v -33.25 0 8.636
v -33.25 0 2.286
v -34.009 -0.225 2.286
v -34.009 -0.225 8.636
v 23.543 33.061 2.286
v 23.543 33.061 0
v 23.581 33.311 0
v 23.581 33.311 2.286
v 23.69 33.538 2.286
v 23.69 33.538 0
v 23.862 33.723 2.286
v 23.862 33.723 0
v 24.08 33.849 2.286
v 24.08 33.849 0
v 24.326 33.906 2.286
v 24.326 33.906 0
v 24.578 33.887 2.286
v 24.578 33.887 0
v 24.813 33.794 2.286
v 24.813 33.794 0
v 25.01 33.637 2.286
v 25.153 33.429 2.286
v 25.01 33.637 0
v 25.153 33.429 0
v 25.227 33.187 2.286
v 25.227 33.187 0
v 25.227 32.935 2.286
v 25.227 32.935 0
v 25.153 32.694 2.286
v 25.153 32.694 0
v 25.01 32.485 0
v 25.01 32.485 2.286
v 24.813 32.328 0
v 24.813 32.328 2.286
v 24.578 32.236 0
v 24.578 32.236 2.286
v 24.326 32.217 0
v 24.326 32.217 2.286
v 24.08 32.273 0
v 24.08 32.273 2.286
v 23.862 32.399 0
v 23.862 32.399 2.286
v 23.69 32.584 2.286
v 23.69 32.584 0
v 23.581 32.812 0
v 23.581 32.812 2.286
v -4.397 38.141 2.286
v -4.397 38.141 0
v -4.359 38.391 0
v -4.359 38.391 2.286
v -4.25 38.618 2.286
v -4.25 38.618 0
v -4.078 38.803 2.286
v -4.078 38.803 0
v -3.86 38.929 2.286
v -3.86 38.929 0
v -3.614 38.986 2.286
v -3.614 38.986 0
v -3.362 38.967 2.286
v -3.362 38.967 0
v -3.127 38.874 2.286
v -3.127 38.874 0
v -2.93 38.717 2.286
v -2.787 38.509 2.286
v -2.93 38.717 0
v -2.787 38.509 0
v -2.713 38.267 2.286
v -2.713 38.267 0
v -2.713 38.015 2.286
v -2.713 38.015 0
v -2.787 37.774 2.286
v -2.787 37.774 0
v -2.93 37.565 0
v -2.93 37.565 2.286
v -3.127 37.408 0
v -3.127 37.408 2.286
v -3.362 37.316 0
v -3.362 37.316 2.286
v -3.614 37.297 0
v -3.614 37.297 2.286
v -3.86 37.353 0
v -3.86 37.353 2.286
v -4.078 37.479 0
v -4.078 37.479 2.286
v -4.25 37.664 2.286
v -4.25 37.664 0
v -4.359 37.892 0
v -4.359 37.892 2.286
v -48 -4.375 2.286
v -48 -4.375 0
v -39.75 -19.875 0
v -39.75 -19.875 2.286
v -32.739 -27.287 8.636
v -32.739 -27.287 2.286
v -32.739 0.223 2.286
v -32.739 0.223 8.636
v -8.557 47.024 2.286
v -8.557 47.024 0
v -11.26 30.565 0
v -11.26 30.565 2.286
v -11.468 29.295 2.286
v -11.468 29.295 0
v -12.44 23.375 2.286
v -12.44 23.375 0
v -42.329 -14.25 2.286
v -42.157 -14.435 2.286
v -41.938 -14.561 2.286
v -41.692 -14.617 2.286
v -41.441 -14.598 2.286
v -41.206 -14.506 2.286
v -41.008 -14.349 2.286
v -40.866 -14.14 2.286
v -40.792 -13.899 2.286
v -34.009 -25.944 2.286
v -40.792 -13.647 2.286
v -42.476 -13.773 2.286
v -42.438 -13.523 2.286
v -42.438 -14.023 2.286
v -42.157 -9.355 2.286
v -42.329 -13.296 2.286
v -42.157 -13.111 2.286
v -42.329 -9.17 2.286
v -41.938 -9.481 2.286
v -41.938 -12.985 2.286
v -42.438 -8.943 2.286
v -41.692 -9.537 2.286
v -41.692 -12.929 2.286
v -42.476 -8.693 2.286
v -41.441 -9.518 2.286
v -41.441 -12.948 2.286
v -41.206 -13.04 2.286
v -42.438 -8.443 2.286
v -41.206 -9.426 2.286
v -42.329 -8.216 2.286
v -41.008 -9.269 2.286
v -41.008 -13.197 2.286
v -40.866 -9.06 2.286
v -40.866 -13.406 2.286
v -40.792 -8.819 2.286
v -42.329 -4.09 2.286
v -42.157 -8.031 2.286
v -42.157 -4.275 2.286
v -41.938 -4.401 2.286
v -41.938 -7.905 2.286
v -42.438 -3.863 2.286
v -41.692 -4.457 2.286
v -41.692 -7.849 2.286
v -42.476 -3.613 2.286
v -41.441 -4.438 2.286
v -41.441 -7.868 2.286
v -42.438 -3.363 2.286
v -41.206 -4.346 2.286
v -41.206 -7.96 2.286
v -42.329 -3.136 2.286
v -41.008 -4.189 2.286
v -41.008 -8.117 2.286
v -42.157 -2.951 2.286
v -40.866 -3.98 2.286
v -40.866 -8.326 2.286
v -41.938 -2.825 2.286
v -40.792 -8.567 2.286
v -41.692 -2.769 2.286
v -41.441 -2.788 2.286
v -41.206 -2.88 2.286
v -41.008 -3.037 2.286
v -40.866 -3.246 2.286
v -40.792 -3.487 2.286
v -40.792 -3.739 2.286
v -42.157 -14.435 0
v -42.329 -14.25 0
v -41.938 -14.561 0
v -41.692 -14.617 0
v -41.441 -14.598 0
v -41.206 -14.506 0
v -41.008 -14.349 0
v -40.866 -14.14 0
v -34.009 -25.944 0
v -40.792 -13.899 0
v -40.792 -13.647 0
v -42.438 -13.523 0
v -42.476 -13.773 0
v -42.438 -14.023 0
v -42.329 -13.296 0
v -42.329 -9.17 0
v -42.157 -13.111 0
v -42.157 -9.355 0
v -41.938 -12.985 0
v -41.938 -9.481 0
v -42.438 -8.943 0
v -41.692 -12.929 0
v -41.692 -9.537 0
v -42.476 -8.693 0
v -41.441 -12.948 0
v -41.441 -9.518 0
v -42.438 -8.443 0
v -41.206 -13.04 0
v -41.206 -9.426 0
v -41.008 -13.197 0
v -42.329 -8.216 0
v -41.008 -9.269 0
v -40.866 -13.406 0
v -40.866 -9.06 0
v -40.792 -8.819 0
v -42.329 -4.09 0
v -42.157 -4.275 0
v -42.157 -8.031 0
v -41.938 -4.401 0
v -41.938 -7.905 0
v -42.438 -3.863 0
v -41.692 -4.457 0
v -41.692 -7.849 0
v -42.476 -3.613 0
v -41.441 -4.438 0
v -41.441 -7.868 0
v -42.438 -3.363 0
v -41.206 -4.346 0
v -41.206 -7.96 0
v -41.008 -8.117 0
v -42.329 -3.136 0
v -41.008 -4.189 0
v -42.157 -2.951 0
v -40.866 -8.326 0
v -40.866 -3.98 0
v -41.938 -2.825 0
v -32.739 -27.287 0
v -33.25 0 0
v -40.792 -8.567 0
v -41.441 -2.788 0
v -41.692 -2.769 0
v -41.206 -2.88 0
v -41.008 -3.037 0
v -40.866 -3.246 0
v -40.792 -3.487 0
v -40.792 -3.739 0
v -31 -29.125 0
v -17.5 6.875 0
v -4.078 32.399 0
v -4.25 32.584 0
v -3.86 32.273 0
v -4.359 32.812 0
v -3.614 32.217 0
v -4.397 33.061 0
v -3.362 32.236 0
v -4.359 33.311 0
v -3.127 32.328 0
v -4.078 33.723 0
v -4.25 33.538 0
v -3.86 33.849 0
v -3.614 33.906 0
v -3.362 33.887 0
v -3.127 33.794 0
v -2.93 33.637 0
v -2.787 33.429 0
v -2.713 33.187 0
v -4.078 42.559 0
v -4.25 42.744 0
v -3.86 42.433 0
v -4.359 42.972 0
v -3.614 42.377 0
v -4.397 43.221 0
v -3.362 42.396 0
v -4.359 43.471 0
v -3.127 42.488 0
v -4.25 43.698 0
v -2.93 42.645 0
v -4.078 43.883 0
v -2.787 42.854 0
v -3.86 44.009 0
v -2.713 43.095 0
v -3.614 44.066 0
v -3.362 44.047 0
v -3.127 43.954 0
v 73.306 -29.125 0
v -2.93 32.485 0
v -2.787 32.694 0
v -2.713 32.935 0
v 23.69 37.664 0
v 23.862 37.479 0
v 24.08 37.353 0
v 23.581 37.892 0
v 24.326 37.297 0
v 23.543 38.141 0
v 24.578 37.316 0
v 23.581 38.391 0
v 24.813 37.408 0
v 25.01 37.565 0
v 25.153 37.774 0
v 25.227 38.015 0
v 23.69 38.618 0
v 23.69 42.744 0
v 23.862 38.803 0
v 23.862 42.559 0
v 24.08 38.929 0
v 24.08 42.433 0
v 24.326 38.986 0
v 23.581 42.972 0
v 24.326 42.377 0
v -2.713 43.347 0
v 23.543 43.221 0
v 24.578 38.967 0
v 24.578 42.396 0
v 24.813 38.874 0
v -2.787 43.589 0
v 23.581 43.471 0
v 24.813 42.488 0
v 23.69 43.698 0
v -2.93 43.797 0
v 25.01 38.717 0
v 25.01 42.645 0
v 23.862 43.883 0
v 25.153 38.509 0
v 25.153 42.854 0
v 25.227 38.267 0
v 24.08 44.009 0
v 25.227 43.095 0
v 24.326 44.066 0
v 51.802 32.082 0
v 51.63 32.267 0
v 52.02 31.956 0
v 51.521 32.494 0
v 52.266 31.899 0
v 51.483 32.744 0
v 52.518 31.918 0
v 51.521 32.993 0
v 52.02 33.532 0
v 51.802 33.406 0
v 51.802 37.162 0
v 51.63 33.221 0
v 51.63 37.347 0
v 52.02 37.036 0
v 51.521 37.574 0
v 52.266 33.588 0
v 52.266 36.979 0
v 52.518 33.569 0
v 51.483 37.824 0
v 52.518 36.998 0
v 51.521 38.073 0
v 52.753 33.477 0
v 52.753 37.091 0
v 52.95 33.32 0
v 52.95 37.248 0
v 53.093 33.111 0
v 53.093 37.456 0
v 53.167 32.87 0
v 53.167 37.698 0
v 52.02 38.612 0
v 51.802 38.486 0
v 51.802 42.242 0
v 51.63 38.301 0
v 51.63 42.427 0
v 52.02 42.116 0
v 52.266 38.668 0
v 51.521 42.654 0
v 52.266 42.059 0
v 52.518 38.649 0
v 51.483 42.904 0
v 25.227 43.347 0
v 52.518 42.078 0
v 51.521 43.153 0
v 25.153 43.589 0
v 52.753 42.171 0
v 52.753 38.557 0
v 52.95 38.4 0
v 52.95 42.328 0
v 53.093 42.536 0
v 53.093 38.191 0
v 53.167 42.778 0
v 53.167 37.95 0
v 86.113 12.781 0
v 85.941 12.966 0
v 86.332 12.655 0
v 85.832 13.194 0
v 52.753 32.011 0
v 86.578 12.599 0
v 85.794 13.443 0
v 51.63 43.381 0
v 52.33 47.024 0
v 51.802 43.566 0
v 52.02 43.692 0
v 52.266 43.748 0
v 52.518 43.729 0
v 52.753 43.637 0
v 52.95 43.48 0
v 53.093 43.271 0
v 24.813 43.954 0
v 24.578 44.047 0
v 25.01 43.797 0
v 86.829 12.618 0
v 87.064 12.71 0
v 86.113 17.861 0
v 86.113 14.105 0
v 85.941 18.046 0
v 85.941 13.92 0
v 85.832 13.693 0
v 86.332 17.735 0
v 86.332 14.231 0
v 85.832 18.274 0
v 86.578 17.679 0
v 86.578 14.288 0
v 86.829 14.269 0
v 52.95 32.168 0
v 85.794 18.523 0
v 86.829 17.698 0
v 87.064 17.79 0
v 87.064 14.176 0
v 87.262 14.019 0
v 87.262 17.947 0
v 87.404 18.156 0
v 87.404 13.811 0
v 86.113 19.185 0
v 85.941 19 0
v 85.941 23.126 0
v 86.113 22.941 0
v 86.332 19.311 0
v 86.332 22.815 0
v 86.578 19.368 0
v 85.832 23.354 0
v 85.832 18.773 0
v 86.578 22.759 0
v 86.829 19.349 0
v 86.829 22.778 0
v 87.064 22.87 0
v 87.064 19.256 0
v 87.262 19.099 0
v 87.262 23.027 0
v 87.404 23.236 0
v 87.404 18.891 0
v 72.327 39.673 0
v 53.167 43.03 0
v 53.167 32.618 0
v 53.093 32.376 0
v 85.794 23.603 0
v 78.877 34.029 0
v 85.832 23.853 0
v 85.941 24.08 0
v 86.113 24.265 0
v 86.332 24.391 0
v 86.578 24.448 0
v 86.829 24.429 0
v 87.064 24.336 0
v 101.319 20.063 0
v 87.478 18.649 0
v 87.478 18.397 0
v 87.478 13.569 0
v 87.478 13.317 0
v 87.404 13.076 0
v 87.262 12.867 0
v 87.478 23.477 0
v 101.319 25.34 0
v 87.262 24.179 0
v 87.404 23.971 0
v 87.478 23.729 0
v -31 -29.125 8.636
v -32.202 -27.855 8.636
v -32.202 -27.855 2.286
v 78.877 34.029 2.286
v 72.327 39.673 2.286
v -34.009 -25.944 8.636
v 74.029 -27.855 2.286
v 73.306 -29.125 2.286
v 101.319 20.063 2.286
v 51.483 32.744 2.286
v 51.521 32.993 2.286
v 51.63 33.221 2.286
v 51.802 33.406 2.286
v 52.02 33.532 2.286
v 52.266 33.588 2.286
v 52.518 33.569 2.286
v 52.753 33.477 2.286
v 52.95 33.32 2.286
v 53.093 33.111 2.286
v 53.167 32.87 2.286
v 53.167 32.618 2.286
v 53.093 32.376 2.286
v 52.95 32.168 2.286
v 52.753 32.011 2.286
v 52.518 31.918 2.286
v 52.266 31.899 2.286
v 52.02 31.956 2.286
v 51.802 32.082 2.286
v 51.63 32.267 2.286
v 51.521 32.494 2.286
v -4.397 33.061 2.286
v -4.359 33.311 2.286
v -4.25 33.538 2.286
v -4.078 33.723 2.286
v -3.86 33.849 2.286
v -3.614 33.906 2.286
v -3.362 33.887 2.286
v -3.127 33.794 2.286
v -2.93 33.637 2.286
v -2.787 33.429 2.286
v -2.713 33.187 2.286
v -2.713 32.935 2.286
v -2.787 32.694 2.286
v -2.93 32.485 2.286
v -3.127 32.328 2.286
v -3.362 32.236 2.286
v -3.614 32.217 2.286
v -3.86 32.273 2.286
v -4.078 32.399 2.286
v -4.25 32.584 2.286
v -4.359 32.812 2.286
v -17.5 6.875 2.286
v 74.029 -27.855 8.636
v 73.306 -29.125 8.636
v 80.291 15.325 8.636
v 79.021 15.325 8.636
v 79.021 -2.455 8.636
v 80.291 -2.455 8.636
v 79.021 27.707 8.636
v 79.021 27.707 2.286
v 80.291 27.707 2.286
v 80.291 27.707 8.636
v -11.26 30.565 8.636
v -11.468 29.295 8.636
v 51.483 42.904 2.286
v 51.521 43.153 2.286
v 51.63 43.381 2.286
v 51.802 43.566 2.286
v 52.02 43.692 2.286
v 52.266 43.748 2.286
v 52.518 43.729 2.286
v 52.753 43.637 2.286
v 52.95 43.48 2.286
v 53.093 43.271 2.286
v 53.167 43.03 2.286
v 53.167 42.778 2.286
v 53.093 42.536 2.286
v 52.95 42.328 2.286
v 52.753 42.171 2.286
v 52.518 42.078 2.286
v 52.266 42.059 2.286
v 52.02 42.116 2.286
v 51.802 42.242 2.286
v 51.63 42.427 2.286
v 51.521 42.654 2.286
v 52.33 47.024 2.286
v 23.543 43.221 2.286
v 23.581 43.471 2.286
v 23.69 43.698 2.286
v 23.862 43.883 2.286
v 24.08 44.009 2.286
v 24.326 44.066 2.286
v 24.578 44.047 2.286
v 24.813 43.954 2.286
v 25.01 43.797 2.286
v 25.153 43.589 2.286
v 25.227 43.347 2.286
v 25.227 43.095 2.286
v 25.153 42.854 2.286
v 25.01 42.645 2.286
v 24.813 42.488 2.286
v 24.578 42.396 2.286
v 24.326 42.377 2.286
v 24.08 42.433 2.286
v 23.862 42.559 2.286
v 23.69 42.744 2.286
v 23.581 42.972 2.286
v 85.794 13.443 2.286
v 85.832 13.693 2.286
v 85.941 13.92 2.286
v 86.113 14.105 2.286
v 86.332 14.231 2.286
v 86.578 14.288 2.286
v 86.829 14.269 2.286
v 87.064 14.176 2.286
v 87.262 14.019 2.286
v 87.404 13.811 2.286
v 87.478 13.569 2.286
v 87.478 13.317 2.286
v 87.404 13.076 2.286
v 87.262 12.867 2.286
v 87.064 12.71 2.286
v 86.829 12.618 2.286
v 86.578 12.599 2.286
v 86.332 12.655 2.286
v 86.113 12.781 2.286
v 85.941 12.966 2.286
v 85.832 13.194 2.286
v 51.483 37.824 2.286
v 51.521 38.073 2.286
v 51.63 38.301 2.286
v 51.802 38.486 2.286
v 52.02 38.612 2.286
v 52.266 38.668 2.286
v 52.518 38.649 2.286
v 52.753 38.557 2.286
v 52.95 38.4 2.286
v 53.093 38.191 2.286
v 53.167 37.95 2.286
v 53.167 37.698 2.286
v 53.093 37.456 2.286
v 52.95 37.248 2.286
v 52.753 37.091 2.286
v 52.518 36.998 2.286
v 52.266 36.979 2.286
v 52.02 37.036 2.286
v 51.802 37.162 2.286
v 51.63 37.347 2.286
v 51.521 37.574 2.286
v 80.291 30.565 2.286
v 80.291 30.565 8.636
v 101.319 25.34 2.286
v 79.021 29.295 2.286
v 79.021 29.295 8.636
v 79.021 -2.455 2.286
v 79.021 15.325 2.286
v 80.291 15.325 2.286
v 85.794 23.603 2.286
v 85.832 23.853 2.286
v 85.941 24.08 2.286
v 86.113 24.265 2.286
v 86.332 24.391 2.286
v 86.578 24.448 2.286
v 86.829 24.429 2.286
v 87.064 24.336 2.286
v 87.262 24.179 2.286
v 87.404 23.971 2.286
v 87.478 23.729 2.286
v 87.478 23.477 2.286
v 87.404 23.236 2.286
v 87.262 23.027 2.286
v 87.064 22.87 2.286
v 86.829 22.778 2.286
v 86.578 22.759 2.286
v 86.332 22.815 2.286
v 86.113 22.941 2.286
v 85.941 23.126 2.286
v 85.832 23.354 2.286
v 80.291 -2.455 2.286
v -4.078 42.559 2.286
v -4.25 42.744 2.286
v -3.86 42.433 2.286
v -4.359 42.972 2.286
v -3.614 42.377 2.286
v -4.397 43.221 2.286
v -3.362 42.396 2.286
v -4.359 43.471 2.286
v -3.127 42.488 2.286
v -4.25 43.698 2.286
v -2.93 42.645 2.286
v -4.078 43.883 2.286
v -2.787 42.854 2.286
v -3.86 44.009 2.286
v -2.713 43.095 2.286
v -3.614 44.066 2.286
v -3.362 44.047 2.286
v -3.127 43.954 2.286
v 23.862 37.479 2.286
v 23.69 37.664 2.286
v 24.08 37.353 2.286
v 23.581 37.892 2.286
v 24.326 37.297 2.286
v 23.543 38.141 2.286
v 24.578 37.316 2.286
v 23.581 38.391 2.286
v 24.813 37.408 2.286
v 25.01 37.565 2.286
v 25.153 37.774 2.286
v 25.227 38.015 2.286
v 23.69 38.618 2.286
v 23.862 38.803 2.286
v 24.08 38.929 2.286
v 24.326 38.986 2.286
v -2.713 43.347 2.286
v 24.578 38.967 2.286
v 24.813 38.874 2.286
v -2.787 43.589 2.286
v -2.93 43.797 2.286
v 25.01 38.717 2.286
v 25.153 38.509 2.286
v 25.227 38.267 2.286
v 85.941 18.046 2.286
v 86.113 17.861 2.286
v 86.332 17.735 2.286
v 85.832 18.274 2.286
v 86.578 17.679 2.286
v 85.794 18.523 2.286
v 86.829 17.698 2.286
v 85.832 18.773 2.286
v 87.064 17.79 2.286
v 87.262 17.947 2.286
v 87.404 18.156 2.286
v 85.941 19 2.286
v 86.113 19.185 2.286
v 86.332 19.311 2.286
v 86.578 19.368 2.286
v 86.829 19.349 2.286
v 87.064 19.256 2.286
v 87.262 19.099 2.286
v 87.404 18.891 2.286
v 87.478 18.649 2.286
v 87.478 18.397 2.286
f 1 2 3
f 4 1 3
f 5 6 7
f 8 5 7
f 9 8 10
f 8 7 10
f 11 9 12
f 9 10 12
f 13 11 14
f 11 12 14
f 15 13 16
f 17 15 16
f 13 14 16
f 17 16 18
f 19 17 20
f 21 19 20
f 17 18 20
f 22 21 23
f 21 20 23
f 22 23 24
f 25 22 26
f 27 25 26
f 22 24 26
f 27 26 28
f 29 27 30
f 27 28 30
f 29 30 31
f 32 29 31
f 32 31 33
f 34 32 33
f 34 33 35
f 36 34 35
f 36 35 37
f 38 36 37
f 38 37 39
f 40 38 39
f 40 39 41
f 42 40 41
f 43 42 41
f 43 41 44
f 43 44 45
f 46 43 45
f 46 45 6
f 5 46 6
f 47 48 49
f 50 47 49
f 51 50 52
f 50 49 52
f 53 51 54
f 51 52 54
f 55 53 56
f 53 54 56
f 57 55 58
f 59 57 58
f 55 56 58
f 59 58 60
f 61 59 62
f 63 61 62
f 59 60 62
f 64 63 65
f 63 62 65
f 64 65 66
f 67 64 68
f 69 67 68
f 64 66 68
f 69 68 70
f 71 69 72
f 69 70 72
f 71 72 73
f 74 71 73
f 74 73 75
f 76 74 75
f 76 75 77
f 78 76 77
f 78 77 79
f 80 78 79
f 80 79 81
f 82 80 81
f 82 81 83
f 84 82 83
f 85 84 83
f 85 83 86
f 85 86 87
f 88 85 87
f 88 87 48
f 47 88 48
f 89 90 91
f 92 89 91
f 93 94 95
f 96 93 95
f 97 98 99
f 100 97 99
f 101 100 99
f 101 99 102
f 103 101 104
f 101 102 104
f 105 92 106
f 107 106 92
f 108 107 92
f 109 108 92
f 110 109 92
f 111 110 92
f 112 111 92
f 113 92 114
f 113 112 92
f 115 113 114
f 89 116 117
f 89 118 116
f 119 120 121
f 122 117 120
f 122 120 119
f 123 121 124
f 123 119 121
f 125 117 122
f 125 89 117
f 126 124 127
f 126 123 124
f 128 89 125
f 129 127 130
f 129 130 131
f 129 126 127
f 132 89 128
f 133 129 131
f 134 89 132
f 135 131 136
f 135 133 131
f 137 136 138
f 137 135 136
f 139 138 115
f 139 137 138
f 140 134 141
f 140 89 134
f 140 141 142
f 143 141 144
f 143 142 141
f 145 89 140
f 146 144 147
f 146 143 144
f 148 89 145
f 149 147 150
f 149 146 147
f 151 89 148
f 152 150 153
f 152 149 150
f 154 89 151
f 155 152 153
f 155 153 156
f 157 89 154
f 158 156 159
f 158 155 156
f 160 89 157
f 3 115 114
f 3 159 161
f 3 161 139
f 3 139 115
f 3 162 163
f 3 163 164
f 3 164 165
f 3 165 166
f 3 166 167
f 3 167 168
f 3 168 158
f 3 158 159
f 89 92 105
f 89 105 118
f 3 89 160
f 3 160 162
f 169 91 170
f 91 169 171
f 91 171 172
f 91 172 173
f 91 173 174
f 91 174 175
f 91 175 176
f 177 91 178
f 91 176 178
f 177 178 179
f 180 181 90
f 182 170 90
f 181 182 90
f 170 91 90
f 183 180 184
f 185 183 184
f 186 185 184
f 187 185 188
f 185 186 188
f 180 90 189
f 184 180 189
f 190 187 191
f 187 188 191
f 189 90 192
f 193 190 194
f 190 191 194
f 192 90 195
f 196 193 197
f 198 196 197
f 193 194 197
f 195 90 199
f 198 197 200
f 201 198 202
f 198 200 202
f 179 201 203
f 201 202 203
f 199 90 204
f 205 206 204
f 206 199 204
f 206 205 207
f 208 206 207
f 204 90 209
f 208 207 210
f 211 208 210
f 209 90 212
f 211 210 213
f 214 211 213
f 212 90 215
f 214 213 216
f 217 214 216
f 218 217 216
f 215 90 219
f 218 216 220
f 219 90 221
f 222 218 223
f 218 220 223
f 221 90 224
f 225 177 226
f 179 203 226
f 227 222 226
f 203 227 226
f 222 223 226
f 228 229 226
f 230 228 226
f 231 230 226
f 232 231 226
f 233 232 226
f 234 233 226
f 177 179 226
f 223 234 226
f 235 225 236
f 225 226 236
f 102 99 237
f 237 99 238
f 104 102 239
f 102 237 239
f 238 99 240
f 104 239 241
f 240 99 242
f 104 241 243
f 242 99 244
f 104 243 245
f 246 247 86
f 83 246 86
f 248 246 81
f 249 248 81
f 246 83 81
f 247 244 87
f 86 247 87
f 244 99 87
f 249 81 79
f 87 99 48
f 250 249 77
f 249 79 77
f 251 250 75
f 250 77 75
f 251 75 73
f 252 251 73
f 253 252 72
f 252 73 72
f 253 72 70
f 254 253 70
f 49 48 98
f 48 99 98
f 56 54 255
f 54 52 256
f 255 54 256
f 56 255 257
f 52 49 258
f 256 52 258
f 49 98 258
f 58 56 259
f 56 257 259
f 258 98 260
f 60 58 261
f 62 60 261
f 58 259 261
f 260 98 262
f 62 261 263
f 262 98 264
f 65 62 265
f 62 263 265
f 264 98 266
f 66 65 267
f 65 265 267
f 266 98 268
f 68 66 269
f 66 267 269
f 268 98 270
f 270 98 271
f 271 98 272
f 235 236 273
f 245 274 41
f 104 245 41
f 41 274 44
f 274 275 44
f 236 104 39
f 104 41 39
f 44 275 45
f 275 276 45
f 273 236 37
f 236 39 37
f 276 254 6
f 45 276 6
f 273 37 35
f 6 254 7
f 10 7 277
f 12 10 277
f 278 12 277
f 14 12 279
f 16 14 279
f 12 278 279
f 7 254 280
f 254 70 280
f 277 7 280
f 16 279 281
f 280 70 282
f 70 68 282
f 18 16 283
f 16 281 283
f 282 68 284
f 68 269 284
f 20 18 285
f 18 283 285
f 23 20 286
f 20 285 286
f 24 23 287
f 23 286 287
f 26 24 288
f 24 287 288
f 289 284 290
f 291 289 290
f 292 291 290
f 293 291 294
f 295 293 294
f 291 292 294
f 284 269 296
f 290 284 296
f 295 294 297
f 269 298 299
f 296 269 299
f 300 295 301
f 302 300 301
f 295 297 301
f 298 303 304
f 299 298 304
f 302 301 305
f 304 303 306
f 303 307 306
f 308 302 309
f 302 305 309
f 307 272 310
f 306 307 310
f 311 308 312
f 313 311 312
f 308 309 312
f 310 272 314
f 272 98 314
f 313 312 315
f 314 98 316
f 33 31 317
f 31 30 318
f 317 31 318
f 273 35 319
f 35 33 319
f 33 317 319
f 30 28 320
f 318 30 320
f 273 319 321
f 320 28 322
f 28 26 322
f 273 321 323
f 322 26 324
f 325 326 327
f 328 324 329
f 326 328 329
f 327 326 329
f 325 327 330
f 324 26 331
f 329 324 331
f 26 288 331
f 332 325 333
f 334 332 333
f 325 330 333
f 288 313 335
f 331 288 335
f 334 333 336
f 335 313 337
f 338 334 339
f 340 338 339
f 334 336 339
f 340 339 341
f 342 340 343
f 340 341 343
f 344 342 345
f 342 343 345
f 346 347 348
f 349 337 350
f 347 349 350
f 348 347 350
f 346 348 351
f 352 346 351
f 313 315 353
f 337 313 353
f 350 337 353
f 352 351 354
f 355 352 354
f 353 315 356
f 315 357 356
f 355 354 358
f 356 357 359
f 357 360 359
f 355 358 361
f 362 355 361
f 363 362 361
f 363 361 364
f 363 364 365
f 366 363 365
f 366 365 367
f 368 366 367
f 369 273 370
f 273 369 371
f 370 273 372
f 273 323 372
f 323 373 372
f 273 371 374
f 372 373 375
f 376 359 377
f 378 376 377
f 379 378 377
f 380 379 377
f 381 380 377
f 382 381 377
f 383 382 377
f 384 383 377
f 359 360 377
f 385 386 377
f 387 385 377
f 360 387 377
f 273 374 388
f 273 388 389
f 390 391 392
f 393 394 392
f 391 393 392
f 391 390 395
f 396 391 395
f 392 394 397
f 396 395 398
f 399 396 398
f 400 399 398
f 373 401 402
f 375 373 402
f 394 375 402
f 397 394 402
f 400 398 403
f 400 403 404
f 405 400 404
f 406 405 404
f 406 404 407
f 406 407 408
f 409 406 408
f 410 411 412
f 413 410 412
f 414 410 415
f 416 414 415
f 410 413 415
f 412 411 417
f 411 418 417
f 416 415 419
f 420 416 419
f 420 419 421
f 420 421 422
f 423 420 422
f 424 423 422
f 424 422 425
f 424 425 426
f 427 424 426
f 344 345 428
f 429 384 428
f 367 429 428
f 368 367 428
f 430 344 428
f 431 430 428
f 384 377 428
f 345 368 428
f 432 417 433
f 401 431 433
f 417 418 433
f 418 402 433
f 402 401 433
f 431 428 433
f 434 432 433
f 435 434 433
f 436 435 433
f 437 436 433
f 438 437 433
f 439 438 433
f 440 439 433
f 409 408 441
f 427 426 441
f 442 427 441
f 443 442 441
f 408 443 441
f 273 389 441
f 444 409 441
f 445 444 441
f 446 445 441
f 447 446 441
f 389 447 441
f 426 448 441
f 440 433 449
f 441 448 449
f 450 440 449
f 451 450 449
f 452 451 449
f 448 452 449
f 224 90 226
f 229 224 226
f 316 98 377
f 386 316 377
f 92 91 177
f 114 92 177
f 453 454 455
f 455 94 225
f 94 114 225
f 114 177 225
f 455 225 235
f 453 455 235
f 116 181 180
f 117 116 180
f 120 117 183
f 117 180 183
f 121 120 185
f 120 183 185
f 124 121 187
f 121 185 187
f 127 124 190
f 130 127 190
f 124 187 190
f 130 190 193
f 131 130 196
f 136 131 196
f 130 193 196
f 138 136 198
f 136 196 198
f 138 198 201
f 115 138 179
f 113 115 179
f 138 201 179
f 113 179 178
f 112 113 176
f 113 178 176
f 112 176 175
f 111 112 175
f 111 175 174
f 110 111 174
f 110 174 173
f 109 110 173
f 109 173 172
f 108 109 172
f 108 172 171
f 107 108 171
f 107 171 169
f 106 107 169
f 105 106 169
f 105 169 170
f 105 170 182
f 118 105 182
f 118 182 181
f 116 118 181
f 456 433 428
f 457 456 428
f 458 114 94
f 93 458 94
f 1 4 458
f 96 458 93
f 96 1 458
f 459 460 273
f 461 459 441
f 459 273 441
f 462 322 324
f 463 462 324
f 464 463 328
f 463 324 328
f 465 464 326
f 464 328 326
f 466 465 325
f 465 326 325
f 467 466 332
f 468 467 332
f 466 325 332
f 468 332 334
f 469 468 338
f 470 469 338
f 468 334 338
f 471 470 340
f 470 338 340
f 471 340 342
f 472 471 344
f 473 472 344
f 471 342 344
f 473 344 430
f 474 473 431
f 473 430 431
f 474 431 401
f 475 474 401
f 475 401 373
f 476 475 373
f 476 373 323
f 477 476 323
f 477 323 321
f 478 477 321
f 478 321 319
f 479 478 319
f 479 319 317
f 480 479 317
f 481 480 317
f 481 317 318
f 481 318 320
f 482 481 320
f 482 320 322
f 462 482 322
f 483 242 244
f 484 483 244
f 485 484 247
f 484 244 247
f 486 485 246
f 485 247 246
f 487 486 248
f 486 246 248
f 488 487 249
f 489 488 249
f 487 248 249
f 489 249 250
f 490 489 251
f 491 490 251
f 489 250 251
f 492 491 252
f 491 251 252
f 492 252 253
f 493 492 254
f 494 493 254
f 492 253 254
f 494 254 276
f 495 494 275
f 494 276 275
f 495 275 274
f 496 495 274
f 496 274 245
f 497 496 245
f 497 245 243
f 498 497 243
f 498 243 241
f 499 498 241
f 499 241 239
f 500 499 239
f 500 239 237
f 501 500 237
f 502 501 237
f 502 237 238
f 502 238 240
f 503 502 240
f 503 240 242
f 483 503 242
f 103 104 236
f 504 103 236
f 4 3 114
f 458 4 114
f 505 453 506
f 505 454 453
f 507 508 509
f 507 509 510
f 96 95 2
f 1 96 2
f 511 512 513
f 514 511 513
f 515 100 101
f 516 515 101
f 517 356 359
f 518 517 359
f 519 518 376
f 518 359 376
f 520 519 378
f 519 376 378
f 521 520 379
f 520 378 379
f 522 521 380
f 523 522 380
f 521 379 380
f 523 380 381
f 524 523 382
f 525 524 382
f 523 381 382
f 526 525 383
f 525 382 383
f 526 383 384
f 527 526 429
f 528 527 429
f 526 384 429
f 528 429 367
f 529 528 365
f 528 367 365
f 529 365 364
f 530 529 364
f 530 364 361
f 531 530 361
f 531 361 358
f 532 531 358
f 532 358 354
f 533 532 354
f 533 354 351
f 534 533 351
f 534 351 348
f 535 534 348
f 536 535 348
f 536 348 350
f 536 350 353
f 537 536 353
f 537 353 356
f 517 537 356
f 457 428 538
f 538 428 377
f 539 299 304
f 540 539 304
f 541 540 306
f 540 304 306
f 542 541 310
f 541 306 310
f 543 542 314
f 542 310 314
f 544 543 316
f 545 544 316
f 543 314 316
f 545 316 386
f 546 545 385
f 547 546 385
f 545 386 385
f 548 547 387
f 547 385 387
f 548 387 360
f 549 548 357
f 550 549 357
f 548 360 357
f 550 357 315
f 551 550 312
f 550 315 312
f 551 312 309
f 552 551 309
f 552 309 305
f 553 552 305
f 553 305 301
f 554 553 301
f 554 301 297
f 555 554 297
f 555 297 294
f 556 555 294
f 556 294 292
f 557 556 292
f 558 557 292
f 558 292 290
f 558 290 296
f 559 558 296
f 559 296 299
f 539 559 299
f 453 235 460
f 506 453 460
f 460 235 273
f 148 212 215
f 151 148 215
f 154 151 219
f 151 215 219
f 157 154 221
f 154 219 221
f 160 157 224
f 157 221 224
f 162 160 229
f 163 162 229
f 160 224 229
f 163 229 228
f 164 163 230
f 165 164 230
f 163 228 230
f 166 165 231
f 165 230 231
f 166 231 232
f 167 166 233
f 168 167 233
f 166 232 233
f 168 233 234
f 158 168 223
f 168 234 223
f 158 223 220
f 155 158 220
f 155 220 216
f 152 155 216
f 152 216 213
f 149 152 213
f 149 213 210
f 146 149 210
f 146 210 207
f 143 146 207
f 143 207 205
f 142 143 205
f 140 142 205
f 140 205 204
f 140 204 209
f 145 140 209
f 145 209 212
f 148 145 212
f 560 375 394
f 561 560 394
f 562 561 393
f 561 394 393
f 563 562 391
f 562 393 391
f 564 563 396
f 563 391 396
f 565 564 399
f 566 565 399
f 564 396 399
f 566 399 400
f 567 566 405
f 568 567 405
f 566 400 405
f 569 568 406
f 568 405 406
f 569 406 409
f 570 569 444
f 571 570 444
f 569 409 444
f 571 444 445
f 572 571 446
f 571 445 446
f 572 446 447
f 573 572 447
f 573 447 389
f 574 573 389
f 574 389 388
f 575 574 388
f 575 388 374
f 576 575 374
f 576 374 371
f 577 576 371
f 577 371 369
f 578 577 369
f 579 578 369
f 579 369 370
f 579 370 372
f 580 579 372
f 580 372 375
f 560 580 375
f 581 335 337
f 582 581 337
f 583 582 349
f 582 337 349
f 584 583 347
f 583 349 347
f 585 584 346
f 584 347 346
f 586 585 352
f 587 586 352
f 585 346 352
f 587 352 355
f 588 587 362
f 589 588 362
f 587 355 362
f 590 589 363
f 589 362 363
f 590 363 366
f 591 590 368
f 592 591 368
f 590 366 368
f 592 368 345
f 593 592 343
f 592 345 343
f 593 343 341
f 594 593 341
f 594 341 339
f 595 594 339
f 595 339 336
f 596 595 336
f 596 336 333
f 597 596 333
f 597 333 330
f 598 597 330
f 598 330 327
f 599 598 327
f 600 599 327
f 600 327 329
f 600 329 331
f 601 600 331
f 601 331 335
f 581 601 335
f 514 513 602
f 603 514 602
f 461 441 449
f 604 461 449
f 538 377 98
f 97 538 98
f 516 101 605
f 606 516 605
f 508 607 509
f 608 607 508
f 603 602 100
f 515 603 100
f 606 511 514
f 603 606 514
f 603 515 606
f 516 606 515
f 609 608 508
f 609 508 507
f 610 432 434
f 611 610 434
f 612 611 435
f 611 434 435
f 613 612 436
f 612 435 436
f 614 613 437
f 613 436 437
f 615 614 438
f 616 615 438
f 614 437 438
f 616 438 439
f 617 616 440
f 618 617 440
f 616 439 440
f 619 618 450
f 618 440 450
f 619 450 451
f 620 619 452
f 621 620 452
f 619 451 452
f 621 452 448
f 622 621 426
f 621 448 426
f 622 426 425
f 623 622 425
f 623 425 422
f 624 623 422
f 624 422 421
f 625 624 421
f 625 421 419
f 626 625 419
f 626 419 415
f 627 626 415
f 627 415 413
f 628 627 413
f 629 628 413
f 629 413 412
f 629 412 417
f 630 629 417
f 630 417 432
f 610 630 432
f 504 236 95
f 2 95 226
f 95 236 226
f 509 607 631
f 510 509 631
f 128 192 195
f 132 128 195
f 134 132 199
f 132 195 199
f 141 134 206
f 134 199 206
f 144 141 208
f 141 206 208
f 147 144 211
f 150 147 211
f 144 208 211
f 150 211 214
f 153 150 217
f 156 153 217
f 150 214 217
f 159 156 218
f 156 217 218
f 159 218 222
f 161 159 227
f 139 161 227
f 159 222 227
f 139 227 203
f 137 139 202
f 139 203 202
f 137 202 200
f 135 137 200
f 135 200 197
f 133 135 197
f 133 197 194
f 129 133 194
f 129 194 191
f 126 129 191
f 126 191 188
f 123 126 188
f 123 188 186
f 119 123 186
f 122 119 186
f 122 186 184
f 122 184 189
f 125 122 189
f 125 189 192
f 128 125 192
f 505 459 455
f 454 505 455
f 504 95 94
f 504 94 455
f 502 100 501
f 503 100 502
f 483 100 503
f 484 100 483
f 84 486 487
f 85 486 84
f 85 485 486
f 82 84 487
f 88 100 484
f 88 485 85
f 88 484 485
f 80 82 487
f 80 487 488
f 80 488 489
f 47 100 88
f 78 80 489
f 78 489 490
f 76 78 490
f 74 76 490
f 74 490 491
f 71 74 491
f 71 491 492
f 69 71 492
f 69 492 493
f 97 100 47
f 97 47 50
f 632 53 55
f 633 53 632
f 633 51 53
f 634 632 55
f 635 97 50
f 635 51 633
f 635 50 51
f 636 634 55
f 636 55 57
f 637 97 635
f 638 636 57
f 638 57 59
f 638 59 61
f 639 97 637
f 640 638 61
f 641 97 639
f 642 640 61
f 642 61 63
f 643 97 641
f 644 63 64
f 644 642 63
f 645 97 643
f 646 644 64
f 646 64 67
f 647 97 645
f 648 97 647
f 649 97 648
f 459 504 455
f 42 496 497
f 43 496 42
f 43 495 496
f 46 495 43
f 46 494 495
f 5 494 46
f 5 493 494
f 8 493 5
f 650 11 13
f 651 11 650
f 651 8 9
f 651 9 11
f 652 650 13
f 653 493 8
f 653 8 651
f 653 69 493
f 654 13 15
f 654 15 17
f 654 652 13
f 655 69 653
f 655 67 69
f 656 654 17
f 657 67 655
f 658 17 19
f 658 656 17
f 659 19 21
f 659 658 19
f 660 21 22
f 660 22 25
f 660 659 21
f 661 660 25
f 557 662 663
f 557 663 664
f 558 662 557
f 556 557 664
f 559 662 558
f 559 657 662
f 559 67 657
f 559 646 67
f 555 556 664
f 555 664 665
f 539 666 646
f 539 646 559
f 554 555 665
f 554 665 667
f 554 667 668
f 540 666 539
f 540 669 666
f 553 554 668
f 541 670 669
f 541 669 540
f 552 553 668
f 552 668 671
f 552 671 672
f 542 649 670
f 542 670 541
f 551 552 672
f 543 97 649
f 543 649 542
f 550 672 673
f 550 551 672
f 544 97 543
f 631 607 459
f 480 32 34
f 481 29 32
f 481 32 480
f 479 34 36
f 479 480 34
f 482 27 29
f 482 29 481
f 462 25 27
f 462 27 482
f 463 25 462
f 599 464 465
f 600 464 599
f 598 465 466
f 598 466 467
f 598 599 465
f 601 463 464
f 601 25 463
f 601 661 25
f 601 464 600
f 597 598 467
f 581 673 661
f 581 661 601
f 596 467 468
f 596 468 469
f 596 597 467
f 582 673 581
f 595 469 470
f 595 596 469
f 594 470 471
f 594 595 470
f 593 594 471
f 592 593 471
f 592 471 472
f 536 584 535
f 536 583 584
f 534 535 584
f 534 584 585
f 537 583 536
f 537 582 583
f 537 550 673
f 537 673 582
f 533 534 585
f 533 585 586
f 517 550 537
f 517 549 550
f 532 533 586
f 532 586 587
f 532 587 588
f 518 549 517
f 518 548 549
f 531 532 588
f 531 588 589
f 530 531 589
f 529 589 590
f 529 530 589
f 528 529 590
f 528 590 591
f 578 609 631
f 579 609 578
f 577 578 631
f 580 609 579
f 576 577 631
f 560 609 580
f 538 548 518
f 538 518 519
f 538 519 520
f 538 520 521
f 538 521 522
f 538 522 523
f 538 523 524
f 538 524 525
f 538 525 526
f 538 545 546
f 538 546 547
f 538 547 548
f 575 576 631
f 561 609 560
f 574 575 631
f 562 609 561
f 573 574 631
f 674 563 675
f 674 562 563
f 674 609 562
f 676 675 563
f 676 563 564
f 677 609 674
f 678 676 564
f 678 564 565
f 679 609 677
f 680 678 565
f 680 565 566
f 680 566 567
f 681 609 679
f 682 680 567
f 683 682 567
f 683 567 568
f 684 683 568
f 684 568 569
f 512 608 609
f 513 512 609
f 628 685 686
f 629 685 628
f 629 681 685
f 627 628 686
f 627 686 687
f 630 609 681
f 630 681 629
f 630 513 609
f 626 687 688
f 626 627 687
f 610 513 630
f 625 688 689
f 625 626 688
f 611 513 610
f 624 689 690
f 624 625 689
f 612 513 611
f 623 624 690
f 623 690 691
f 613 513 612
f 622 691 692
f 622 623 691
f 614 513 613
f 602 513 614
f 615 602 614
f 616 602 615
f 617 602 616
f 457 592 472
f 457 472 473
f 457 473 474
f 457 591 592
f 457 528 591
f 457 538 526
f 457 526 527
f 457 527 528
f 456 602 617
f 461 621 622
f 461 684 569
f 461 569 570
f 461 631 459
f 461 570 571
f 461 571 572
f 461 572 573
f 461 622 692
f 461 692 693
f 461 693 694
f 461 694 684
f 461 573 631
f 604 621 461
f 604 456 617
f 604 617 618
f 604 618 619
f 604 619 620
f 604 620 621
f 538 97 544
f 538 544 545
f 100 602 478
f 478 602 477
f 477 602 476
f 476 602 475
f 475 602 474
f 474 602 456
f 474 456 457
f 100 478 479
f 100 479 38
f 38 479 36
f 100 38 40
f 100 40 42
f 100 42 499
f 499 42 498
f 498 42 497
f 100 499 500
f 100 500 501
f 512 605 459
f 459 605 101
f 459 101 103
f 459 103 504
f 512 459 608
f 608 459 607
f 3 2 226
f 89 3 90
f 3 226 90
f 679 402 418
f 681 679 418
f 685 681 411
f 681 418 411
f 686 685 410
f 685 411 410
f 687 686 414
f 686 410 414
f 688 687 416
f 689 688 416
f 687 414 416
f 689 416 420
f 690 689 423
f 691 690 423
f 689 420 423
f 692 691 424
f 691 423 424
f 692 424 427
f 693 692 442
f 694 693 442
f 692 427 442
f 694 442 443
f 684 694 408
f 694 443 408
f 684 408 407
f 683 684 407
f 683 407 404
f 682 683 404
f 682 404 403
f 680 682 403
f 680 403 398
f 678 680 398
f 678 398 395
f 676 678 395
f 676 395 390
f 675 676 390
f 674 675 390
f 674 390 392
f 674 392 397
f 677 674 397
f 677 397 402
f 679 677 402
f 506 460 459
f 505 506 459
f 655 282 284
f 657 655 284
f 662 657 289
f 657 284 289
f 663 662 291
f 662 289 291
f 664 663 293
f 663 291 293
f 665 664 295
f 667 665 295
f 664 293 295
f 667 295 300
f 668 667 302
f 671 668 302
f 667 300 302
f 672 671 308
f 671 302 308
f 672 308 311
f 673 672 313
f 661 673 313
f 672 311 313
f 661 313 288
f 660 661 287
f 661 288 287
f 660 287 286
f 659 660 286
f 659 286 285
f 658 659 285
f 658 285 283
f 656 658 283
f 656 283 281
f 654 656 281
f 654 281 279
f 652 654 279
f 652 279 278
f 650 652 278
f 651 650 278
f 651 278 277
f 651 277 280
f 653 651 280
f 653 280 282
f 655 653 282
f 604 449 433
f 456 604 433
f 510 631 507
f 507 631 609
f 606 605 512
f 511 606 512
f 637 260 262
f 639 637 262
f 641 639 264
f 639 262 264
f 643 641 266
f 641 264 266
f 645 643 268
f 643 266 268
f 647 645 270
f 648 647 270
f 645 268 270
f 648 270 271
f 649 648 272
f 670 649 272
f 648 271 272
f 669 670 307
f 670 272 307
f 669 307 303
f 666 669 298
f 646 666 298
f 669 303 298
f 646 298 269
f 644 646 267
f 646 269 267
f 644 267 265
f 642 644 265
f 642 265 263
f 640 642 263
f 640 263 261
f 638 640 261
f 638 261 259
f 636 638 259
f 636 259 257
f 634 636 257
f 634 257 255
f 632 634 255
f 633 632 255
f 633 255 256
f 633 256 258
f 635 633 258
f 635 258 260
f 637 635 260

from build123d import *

# Parameters (mm, degrees)
F1_DEPTH      = 2.286
F2_W          = 1.27
F2_H          = 17.78
F3_DEPTH      = 6.35
F3_DEPTH_BACK = 2.286
F4_D          = 1.6933333333


# Not quite as in the source:
# - a feature names something its author has since deleted; it is built from what else it names


with BuildPart() as f1:
    # F0 (on Top) → F1 (new body)
    with BuildSketch(Plane.XY):
        Polygon((-39.7502322496, -19.8751161248), (-31.0001806734, -29.1251689516), (73.3058652154, -29.1251689516), (101.3186621261, 20.063493978), (101.3186621261, 25.3395497125), (78.8771229202, 34.0285638846), (72.3271246897, 39.6729167182), (52.3297434038, 47.023841916), (50.4247434038, 47.023841916), (21.8864718038, 47.023841916), (19.9814718038, 47.023841916), (-8.5567997962, 47.023841916), (-12.4402794499, 23.3751358177), (-17.5001015898, 6.8750406358), (-33.2501941145, 0), (-48.0002794499, -4.3750257881), align=None)
    extrude(amount=F1_DEPTH)

    # F2 (on face) → F3 (join, two sides)
    with BuildSketch(Plane.XY.offset(2.286)) as f3_sk:
        with Locations((79.6558652154, 6.4348310484)):
            Rectangle(F2_W, F2_H)
        Polygon((-32.2015322451, -27.8551689516), (-31.0001806734, -29.1251689516), (73.3058652154, -29.1251689516), (74.0291264296, -27.8551689516), align=None)
        Polygon((80.2908652154, 30.5648310484), (-11.2596214034, 30.5648310484), (-11.4681748498, 29.2948310484), (79.0208652154, 29.2948310484), (79.0208652154, 27.7073310484), (80.2908652154, 27.7073310484), align=None)
        Polygon((-34.0091347846, -0.2251095453), (-34.0091347846, -25.944275189), (-32.7391347846, -27.2868463713), (-32.7391347846, 0.2230814616), (-33.2501941145, 0), align=None)
    extrude(amount=F3_DEPTH)
    extrude(f3_sk.sketch, amount=-F3_DEPTH_BACK)

    # F4 (through all)
    with Locations(Plane.XY.offset(2.286)):
        with Locations((-41.6291347846, -13.7730257881), (-41.6291347846, -8.6930257881), (-41.6291347846, -3.6130257881), (-3.5502565962, 43.2212361431), (-3.5502565962, 38.1412361431), (-3.5502565962, 33.0612361431), (24.3897434038, 43.2212361431), (24.3897434038, 38.1412361431), (24.3897434038, 33.0612361431), (52.3297434038, 42.9037361431), (52.3297434038, 37.8237361431), (52.3297434038, 32.7437361431), (86.6408652154, 23.6032530031), (86.6408652154, 18.5232530031), (86.6408652154, 13.4432530031)):
            Hole(F4_D / 2)


solid = f1.part
